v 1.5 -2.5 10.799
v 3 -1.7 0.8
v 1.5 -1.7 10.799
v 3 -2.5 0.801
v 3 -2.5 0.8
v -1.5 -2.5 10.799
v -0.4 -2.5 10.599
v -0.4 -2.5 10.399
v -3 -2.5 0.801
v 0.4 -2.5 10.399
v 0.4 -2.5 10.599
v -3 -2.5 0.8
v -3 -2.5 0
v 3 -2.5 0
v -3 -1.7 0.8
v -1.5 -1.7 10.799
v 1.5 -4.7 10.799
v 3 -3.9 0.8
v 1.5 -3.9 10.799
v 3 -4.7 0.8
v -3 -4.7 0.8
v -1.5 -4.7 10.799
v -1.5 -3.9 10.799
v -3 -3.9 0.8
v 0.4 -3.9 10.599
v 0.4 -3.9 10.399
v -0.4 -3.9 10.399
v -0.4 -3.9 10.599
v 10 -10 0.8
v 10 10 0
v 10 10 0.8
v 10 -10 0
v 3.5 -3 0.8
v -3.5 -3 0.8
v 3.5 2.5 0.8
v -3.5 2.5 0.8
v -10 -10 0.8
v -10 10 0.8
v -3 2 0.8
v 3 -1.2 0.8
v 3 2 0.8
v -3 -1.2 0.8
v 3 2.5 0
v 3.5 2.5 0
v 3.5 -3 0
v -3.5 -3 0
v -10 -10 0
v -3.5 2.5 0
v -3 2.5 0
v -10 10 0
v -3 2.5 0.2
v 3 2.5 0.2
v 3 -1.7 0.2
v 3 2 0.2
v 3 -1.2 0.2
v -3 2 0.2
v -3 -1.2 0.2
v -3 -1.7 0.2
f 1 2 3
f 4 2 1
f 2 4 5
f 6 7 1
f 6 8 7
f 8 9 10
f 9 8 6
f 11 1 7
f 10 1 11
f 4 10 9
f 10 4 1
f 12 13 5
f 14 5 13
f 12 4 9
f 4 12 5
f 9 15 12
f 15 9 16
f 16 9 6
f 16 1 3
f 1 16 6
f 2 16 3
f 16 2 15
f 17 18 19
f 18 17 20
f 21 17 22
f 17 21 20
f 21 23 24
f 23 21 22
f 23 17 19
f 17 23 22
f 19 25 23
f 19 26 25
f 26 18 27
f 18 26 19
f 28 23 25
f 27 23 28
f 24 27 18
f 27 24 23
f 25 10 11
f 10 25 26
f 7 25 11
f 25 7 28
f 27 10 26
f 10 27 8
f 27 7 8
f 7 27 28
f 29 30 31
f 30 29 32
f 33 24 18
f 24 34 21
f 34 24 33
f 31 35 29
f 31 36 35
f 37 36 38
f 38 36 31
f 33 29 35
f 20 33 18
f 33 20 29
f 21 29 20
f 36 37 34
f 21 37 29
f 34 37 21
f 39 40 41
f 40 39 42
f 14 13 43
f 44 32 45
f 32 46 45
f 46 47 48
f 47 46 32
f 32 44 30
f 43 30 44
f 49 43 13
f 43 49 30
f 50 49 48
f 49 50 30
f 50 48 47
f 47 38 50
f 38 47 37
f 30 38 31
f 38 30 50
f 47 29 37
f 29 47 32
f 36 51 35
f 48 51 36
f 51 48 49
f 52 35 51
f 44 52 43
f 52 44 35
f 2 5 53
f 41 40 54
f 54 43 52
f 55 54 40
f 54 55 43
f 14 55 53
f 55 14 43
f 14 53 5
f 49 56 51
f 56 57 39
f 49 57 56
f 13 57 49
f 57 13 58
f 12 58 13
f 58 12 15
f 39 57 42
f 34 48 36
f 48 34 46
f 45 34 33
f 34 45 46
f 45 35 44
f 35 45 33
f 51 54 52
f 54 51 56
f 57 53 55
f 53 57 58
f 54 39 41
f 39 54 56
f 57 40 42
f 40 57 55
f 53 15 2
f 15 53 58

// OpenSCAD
e=.001;

w=6;
d=5;
gap=.5;
h=10;
thickness=.8;
flex_d=3;
flex_thickness=.2;
flex_pitch=2;

module button_keepout()
{
translate([0,0,-e])
linear_extrude(thickness+2*e)
difference()
{
	translate([-w/2-gap, -d/2-gap])
	square([w+2*gap, d+gap]);

	translate([-w/2, -d/2])
	square([w, d+e]);
}

translate([0,0,flex_thickness])
linear_extrude(thickness-flex_thickness+e)
for (i=[d/2-gap, -d/2+thickness])
translate([-w/2-gap, i])
square([w+2*gap, gap]);
}

module button_shape()
{
translate([-10,-10, 0])
cube([20,20,thickness]);

translate([0,0,thickness-e])
{
for (i=[-d/2+thickness, -d/2-flex_d+thickness*2])
translate([0,i,0])
	rotate([90,0,0])
	linear_extrude(thickness)
	polygon([ [-w/2,0], [w/2, 0], [flex_d/2, h], [-flex_d/2, h]]);


translate([-thickness/2,-d/2+thickness-flex_d,h-flex_thickness*2])
	cube([thickness, flex_d, flex_thickness]);
}
}

difference()
{
button_shape();
button_keepout();
}
